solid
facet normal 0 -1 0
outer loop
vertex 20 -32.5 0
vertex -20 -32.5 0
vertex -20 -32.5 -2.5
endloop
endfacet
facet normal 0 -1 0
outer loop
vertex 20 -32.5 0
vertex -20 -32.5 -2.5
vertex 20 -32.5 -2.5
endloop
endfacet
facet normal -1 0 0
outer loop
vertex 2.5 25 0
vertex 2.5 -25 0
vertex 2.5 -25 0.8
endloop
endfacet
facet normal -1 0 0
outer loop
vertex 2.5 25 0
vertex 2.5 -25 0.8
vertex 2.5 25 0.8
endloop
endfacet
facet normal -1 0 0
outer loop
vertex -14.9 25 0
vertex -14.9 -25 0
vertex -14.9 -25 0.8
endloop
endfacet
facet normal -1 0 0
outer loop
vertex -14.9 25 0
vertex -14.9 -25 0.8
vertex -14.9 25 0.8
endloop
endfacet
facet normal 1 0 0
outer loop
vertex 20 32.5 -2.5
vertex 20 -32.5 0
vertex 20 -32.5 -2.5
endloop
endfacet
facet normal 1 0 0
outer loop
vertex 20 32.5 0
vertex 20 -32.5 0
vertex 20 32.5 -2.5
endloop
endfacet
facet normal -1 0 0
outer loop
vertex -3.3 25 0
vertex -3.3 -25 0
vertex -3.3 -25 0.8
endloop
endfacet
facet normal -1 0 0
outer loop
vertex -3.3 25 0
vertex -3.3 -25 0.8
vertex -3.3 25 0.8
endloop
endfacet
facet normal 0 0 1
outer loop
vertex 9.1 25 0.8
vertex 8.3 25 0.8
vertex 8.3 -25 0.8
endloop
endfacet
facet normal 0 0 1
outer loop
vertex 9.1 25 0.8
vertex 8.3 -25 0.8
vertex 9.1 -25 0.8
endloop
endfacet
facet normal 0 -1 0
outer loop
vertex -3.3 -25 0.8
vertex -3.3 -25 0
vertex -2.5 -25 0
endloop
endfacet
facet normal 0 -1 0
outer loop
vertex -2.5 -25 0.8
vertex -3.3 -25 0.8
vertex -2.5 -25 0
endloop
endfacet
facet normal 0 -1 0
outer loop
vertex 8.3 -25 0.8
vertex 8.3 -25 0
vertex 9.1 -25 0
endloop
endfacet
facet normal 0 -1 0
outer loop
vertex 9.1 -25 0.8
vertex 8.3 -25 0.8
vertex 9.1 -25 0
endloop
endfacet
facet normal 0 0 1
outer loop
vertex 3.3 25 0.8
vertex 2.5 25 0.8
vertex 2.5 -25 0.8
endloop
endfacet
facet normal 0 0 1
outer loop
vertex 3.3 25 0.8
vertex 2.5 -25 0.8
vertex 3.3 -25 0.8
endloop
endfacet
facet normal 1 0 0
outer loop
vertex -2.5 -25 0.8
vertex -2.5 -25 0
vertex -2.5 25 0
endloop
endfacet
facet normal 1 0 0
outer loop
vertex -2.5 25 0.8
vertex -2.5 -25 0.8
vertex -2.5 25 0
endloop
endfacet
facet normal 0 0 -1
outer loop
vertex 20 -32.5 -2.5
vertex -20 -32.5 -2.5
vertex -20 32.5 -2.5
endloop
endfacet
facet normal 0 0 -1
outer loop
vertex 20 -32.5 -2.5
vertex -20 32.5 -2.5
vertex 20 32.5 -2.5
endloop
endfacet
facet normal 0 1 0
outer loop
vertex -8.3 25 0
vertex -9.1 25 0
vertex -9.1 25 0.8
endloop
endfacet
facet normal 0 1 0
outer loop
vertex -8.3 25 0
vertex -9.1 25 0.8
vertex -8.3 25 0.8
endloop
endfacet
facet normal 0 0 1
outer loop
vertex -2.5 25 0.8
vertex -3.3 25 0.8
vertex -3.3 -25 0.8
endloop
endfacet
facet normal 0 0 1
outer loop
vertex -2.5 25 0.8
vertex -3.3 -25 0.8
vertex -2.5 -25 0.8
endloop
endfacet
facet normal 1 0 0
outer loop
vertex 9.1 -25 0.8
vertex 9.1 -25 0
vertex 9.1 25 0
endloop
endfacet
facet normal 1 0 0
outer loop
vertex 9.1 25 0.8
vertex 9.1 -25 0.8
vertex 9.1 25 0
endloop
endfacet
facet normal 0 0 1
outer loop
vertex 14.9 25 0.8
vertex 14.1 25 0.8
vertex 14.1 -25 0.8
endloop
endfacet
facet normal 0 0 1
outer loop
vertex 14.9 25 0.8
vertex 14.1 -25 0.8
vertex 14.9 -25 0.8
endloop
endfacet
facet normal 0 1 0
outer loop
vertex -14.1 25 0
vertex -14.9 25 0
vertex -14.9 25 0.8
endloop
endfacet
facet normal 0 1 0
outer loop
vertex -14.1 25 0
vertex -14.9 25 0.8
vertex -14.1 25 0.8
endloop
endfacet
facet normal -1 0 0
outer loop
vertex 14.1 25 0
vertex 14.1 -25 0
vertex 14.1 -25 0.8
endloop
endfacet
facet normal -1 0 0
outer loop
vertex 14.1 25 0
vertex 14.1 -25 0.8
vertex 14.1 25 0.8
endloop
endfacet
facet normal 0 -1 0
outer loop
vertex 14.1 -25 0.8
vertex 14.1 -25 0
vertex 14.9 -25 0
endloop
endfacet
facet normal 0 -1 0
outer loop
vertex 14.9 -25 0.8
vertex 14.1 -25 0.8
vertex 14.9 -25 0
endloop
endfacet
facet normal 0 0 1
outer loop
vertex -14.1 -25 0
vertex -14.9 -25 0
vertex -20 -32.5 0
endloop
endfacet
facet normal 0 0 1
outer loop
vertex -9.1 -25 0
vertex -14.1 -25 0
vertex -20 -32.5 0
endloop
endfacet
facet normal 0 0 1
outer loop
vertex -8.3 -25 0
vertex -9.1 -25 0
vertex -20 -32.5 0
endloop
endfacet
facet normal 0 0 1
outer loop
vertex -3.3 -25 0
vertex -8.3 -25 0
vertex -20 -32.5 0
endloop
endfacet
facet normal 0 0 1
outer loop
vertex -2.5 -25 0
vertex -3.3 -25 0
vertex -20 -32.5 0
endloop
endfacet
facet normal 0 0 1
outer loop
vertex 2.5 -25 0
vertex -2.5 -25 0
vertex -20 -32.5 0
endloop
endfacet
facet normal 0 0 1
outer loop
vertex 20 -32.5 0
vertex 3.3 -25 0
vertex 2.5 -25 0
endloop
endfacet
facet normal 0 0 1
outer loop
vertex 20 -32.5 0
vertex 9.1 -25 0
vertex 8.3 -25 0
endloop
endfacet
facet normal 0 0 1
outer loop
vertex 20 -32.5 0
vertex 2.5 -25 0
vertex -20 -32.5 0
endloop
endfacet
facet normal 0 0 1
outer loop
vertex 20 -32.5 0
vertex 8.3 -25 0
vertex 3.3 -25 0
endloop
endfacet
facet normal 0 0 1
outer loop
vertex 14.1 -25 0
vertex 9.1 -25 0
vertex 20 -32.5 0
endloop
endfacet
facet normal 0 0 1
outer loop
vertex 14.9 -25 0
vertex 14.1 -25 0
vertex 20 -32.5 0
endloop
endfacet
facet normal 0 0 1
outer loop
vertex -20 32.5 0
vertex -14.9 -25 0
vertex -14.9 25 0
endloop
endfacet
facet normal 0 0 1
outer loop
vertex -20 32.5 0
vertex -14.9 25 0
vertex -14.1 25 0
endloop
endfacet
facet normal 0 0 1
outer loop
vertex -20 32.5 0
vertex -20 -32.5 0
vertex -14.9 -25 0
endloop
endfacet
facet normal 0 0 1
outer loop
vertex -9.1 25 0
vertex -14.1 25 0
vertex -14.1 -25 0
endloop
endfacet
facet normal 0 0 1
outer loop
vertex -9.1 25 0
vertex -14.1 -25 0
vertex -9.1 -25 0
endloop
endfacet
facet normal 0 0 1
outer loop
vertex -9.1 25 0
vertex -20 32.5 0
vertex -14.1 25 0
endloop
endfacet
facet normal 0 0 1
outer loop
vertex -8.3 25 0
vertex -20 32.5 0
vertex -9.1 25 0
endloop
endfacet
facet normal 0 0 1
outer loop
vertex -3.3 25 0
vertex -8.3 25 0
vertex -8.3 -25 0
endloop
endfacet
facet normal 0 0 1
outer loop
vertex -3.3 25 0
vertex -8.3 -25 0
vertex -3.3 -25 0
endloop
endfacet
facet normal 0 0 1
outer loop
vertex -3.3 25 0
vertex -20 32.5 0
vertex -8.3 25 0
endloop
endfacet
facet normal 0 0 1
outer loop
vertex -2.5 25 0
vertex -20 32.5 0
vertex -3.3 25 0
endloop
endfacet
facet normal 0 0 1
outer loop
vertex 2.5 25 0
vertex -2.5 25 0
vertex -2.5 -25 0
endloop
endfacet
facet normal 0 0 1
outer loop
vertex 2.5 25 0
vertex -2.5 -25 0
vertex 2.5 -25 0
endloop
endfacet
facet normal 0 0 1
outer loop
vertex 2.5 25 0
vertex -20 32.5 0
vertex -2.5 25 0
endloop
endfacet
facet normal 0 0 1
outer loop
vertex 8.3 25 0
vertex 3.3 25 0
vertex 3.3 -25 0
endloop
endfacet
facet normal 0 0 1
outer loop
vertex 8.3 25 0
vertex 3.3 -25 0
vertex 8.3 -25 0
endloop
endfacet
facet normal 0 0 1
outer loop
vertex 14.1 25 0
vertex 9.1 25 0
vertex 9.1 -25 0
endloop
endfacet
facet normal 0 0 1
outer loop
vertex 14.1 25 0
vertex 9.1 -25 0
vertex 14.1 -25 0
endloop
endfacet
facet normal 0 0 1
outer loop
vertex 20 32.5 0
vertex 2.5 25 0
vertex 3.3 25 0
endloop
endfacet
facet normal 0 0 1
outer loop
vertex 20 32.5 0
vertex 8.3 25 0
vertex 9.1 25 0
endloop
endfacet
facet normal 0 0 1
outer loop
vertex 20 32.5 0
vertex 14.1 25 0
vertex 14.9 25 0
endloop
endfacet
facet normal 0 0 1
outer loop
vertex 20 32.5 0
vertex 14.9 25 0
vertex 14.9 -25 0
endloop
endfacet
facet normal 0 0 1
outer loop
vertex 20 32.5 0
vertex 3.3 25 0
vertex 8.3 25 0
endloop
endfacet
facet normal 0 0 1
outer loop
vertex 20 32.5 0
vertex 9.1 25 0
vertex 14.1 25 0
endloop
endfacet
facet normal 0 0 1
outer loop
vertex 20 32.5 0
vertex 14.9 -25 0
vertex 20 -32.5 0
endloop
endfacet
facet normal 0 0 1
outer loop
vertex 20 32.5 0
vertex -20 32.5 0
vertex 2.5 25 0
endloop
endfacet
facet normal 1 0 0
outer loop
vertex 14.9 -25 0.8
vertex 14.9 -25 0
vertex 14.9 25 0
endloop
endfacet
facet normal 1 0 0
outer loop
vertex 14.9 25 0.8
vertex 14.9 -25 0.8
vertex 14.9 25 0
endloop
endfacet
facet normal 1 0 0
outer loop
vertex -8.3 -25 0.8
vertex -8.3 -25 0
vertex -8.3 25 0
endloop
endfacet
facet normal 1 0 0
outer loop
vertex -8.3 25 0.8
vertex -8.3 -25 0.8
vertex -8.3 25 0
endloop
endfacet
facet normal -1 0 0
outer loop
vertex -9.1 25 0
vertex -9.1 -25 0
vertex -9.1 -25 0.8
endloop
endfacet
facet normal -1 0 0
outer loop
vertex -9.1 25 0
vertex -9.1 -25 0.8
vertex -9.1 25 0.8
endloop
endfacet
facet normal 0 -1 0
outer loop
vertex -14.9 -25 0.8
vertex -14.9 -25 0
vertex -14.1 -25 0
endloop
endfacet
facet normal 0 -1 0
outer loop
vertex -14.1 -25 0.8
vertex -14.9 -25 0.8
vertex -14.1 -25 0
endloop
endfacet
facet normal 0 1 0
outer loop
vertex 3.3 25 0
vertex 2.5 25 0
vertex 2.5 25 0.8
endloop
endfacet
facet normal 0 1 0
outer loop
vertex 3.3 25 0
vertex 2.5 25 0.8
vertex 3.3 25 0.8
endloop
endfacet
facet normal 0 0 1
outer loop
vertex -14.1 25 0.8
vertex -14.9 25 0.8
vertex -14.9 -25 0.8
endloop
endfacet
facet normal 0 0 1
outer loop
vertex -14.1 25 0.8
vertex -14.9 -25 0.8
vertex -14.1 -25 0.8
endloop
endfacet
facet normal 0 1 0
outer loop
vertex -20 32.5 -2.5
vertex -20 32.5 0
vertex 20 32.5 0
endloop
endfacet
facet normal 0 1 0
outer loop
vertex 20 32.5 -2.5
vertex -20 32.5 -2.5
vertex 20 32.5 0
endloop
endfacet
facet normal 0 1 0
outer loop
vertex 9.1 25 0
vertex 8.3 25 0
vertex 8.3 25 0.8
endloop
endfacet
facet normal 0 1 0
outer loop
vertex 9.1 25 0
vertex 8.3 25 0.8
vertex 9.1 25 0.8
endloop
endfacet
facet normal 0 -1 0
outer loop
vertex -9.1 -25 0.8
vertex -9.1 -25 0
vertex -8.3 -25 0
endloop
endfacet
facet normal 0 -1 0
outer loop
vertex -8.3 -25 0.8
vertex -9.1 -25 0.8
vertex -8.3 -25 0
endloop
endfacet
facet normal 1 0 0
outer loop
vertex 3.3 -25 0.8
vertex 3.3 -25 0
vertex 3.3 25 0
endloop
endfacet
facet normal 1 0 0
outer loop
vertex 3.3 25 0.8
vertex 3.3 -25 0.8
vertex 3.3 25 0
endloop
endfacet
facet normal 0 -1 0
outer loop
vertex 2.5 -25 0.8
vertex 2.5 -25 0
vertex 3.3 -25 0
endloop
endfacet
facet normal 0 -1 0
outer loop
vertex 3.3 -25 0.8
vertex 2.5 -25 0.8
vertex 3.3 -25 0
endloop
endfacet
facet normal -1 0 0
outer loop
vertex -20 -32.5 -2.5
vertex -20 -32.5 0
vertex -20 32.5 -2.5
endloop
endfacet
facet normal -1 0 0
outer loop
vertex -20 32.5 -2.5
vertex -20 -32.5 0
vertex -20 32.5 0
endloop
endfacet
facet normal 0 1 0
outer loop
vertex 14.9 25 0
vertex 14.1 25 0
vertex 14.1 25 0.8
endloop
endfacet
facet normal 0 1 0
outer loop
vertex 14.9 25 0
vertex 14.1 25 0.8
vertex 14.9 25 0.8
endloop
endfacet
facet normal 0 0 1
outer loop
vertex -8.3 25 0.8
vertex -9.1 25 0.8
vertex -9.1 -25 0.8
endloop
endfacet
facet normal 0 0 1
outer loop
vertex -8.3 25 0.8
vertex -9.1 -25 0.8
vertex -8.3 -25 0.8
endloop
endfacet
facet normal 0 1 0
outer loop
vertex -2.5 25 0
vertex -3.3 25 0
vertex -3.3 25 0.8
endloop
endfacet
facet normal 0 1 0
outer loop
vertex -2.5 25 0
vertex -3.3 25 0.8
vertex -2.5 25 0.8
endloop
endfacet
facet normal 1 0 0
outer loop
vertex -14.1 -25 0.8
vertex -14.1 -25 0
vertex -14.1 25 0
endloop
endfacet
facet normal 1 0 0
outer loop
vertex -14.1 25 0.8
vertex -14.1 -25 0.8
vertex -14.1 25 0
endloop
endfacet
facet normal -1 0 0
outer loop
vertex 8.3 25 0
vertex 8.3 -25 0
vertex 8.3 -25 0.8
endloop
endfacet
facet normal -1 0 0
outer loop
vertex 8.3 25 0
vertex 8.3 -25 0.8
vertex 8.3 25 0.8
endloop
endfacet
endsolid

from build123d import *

# Parameters (mm, degrees)
F0_W     = 40
F0_H     = 65
F0_W_2   = 0.8
F0_H_2   = 50
F1_DEPTH = 2.5
F2_DEPTH = 0.8


with BuildPart() as f1:
    # F0 (on Top) → F1 (new body)
    with BuildSketch(Plane.XY):
        Rectangle(F0_W, F0_H)
        with Locations((-14.5, 0)):
            Rectangle(F0_W_2, F0_H_2, mode=Mode.SUBTRACT)
        with Locations((-8.7, 0)):
            Rectangle(F0_W_2, F0_H_2, mode=Mode.SUBTRACT)
        with Locations((-2.9, 0)):
            Rectangle(F0_W_2, F0_H_2, mode=Mode.SUBTRACT)
        with Locations((2.9, 0)):
            Rectangle(F0_W_2, F0_H_2, mode=Mode.SUBTRACT)
        with Locations((8.7, 0)):
            Rectangle(F0_W_2, F0_H_2, mode=Mode.SUBTRACT)
        with Locations((14.5, 0)):
            Rectangle(F0_W_2, F0_H_2, mode=Mode.SUBTRACT)
        with Locations((14.5, 0)):
            Rectangle(F0_W_2, F0_H_2)
        with Locations((8.7, 0)):
            Rectangle(F0_W_2, F0_H_2)
        with Locations((2.9, 0)):
            Rectangle(F0_W_2, F0_H_2)
        with Locations((-2.9, 0)):
            Rectangle(F0_W_2, F0_H_2)
        with Locations((-8.7, 0)):
            Rectangle(F0_W_2, F0_H_2)
        with Locations((-14.5, 0)):
            Rectangle(F0_W_2, F0_H_2)
    extrude(amount=-F1_DEPTH)

    # F0 (on Top) → F2 (join)
    with BuildSketch(Plane.XY):
        with Locations((14.5, 0)):
            Rectangle(F0_W_2, F0_H_2)
        with Locations((8.7, 0)):
            Rectangle(F0_W_2, F0_H_2)
        with Locations((2.9, 0)):
            Rectangle(F0_W_2, F0_H_2)
        with Locations((-2.9, 0)):
            Rectangle(F0_W_2, F0_H_2)
        with Locations((-8.7, 0)):
            Rectangle(F0_W_2, F0_H_2)
        with Locations((-14.5, 0)):
            Rectangle(F0_W_2, F0_H_2)
    extrude(amount=F2_DEPTH)


solid = f1.part
